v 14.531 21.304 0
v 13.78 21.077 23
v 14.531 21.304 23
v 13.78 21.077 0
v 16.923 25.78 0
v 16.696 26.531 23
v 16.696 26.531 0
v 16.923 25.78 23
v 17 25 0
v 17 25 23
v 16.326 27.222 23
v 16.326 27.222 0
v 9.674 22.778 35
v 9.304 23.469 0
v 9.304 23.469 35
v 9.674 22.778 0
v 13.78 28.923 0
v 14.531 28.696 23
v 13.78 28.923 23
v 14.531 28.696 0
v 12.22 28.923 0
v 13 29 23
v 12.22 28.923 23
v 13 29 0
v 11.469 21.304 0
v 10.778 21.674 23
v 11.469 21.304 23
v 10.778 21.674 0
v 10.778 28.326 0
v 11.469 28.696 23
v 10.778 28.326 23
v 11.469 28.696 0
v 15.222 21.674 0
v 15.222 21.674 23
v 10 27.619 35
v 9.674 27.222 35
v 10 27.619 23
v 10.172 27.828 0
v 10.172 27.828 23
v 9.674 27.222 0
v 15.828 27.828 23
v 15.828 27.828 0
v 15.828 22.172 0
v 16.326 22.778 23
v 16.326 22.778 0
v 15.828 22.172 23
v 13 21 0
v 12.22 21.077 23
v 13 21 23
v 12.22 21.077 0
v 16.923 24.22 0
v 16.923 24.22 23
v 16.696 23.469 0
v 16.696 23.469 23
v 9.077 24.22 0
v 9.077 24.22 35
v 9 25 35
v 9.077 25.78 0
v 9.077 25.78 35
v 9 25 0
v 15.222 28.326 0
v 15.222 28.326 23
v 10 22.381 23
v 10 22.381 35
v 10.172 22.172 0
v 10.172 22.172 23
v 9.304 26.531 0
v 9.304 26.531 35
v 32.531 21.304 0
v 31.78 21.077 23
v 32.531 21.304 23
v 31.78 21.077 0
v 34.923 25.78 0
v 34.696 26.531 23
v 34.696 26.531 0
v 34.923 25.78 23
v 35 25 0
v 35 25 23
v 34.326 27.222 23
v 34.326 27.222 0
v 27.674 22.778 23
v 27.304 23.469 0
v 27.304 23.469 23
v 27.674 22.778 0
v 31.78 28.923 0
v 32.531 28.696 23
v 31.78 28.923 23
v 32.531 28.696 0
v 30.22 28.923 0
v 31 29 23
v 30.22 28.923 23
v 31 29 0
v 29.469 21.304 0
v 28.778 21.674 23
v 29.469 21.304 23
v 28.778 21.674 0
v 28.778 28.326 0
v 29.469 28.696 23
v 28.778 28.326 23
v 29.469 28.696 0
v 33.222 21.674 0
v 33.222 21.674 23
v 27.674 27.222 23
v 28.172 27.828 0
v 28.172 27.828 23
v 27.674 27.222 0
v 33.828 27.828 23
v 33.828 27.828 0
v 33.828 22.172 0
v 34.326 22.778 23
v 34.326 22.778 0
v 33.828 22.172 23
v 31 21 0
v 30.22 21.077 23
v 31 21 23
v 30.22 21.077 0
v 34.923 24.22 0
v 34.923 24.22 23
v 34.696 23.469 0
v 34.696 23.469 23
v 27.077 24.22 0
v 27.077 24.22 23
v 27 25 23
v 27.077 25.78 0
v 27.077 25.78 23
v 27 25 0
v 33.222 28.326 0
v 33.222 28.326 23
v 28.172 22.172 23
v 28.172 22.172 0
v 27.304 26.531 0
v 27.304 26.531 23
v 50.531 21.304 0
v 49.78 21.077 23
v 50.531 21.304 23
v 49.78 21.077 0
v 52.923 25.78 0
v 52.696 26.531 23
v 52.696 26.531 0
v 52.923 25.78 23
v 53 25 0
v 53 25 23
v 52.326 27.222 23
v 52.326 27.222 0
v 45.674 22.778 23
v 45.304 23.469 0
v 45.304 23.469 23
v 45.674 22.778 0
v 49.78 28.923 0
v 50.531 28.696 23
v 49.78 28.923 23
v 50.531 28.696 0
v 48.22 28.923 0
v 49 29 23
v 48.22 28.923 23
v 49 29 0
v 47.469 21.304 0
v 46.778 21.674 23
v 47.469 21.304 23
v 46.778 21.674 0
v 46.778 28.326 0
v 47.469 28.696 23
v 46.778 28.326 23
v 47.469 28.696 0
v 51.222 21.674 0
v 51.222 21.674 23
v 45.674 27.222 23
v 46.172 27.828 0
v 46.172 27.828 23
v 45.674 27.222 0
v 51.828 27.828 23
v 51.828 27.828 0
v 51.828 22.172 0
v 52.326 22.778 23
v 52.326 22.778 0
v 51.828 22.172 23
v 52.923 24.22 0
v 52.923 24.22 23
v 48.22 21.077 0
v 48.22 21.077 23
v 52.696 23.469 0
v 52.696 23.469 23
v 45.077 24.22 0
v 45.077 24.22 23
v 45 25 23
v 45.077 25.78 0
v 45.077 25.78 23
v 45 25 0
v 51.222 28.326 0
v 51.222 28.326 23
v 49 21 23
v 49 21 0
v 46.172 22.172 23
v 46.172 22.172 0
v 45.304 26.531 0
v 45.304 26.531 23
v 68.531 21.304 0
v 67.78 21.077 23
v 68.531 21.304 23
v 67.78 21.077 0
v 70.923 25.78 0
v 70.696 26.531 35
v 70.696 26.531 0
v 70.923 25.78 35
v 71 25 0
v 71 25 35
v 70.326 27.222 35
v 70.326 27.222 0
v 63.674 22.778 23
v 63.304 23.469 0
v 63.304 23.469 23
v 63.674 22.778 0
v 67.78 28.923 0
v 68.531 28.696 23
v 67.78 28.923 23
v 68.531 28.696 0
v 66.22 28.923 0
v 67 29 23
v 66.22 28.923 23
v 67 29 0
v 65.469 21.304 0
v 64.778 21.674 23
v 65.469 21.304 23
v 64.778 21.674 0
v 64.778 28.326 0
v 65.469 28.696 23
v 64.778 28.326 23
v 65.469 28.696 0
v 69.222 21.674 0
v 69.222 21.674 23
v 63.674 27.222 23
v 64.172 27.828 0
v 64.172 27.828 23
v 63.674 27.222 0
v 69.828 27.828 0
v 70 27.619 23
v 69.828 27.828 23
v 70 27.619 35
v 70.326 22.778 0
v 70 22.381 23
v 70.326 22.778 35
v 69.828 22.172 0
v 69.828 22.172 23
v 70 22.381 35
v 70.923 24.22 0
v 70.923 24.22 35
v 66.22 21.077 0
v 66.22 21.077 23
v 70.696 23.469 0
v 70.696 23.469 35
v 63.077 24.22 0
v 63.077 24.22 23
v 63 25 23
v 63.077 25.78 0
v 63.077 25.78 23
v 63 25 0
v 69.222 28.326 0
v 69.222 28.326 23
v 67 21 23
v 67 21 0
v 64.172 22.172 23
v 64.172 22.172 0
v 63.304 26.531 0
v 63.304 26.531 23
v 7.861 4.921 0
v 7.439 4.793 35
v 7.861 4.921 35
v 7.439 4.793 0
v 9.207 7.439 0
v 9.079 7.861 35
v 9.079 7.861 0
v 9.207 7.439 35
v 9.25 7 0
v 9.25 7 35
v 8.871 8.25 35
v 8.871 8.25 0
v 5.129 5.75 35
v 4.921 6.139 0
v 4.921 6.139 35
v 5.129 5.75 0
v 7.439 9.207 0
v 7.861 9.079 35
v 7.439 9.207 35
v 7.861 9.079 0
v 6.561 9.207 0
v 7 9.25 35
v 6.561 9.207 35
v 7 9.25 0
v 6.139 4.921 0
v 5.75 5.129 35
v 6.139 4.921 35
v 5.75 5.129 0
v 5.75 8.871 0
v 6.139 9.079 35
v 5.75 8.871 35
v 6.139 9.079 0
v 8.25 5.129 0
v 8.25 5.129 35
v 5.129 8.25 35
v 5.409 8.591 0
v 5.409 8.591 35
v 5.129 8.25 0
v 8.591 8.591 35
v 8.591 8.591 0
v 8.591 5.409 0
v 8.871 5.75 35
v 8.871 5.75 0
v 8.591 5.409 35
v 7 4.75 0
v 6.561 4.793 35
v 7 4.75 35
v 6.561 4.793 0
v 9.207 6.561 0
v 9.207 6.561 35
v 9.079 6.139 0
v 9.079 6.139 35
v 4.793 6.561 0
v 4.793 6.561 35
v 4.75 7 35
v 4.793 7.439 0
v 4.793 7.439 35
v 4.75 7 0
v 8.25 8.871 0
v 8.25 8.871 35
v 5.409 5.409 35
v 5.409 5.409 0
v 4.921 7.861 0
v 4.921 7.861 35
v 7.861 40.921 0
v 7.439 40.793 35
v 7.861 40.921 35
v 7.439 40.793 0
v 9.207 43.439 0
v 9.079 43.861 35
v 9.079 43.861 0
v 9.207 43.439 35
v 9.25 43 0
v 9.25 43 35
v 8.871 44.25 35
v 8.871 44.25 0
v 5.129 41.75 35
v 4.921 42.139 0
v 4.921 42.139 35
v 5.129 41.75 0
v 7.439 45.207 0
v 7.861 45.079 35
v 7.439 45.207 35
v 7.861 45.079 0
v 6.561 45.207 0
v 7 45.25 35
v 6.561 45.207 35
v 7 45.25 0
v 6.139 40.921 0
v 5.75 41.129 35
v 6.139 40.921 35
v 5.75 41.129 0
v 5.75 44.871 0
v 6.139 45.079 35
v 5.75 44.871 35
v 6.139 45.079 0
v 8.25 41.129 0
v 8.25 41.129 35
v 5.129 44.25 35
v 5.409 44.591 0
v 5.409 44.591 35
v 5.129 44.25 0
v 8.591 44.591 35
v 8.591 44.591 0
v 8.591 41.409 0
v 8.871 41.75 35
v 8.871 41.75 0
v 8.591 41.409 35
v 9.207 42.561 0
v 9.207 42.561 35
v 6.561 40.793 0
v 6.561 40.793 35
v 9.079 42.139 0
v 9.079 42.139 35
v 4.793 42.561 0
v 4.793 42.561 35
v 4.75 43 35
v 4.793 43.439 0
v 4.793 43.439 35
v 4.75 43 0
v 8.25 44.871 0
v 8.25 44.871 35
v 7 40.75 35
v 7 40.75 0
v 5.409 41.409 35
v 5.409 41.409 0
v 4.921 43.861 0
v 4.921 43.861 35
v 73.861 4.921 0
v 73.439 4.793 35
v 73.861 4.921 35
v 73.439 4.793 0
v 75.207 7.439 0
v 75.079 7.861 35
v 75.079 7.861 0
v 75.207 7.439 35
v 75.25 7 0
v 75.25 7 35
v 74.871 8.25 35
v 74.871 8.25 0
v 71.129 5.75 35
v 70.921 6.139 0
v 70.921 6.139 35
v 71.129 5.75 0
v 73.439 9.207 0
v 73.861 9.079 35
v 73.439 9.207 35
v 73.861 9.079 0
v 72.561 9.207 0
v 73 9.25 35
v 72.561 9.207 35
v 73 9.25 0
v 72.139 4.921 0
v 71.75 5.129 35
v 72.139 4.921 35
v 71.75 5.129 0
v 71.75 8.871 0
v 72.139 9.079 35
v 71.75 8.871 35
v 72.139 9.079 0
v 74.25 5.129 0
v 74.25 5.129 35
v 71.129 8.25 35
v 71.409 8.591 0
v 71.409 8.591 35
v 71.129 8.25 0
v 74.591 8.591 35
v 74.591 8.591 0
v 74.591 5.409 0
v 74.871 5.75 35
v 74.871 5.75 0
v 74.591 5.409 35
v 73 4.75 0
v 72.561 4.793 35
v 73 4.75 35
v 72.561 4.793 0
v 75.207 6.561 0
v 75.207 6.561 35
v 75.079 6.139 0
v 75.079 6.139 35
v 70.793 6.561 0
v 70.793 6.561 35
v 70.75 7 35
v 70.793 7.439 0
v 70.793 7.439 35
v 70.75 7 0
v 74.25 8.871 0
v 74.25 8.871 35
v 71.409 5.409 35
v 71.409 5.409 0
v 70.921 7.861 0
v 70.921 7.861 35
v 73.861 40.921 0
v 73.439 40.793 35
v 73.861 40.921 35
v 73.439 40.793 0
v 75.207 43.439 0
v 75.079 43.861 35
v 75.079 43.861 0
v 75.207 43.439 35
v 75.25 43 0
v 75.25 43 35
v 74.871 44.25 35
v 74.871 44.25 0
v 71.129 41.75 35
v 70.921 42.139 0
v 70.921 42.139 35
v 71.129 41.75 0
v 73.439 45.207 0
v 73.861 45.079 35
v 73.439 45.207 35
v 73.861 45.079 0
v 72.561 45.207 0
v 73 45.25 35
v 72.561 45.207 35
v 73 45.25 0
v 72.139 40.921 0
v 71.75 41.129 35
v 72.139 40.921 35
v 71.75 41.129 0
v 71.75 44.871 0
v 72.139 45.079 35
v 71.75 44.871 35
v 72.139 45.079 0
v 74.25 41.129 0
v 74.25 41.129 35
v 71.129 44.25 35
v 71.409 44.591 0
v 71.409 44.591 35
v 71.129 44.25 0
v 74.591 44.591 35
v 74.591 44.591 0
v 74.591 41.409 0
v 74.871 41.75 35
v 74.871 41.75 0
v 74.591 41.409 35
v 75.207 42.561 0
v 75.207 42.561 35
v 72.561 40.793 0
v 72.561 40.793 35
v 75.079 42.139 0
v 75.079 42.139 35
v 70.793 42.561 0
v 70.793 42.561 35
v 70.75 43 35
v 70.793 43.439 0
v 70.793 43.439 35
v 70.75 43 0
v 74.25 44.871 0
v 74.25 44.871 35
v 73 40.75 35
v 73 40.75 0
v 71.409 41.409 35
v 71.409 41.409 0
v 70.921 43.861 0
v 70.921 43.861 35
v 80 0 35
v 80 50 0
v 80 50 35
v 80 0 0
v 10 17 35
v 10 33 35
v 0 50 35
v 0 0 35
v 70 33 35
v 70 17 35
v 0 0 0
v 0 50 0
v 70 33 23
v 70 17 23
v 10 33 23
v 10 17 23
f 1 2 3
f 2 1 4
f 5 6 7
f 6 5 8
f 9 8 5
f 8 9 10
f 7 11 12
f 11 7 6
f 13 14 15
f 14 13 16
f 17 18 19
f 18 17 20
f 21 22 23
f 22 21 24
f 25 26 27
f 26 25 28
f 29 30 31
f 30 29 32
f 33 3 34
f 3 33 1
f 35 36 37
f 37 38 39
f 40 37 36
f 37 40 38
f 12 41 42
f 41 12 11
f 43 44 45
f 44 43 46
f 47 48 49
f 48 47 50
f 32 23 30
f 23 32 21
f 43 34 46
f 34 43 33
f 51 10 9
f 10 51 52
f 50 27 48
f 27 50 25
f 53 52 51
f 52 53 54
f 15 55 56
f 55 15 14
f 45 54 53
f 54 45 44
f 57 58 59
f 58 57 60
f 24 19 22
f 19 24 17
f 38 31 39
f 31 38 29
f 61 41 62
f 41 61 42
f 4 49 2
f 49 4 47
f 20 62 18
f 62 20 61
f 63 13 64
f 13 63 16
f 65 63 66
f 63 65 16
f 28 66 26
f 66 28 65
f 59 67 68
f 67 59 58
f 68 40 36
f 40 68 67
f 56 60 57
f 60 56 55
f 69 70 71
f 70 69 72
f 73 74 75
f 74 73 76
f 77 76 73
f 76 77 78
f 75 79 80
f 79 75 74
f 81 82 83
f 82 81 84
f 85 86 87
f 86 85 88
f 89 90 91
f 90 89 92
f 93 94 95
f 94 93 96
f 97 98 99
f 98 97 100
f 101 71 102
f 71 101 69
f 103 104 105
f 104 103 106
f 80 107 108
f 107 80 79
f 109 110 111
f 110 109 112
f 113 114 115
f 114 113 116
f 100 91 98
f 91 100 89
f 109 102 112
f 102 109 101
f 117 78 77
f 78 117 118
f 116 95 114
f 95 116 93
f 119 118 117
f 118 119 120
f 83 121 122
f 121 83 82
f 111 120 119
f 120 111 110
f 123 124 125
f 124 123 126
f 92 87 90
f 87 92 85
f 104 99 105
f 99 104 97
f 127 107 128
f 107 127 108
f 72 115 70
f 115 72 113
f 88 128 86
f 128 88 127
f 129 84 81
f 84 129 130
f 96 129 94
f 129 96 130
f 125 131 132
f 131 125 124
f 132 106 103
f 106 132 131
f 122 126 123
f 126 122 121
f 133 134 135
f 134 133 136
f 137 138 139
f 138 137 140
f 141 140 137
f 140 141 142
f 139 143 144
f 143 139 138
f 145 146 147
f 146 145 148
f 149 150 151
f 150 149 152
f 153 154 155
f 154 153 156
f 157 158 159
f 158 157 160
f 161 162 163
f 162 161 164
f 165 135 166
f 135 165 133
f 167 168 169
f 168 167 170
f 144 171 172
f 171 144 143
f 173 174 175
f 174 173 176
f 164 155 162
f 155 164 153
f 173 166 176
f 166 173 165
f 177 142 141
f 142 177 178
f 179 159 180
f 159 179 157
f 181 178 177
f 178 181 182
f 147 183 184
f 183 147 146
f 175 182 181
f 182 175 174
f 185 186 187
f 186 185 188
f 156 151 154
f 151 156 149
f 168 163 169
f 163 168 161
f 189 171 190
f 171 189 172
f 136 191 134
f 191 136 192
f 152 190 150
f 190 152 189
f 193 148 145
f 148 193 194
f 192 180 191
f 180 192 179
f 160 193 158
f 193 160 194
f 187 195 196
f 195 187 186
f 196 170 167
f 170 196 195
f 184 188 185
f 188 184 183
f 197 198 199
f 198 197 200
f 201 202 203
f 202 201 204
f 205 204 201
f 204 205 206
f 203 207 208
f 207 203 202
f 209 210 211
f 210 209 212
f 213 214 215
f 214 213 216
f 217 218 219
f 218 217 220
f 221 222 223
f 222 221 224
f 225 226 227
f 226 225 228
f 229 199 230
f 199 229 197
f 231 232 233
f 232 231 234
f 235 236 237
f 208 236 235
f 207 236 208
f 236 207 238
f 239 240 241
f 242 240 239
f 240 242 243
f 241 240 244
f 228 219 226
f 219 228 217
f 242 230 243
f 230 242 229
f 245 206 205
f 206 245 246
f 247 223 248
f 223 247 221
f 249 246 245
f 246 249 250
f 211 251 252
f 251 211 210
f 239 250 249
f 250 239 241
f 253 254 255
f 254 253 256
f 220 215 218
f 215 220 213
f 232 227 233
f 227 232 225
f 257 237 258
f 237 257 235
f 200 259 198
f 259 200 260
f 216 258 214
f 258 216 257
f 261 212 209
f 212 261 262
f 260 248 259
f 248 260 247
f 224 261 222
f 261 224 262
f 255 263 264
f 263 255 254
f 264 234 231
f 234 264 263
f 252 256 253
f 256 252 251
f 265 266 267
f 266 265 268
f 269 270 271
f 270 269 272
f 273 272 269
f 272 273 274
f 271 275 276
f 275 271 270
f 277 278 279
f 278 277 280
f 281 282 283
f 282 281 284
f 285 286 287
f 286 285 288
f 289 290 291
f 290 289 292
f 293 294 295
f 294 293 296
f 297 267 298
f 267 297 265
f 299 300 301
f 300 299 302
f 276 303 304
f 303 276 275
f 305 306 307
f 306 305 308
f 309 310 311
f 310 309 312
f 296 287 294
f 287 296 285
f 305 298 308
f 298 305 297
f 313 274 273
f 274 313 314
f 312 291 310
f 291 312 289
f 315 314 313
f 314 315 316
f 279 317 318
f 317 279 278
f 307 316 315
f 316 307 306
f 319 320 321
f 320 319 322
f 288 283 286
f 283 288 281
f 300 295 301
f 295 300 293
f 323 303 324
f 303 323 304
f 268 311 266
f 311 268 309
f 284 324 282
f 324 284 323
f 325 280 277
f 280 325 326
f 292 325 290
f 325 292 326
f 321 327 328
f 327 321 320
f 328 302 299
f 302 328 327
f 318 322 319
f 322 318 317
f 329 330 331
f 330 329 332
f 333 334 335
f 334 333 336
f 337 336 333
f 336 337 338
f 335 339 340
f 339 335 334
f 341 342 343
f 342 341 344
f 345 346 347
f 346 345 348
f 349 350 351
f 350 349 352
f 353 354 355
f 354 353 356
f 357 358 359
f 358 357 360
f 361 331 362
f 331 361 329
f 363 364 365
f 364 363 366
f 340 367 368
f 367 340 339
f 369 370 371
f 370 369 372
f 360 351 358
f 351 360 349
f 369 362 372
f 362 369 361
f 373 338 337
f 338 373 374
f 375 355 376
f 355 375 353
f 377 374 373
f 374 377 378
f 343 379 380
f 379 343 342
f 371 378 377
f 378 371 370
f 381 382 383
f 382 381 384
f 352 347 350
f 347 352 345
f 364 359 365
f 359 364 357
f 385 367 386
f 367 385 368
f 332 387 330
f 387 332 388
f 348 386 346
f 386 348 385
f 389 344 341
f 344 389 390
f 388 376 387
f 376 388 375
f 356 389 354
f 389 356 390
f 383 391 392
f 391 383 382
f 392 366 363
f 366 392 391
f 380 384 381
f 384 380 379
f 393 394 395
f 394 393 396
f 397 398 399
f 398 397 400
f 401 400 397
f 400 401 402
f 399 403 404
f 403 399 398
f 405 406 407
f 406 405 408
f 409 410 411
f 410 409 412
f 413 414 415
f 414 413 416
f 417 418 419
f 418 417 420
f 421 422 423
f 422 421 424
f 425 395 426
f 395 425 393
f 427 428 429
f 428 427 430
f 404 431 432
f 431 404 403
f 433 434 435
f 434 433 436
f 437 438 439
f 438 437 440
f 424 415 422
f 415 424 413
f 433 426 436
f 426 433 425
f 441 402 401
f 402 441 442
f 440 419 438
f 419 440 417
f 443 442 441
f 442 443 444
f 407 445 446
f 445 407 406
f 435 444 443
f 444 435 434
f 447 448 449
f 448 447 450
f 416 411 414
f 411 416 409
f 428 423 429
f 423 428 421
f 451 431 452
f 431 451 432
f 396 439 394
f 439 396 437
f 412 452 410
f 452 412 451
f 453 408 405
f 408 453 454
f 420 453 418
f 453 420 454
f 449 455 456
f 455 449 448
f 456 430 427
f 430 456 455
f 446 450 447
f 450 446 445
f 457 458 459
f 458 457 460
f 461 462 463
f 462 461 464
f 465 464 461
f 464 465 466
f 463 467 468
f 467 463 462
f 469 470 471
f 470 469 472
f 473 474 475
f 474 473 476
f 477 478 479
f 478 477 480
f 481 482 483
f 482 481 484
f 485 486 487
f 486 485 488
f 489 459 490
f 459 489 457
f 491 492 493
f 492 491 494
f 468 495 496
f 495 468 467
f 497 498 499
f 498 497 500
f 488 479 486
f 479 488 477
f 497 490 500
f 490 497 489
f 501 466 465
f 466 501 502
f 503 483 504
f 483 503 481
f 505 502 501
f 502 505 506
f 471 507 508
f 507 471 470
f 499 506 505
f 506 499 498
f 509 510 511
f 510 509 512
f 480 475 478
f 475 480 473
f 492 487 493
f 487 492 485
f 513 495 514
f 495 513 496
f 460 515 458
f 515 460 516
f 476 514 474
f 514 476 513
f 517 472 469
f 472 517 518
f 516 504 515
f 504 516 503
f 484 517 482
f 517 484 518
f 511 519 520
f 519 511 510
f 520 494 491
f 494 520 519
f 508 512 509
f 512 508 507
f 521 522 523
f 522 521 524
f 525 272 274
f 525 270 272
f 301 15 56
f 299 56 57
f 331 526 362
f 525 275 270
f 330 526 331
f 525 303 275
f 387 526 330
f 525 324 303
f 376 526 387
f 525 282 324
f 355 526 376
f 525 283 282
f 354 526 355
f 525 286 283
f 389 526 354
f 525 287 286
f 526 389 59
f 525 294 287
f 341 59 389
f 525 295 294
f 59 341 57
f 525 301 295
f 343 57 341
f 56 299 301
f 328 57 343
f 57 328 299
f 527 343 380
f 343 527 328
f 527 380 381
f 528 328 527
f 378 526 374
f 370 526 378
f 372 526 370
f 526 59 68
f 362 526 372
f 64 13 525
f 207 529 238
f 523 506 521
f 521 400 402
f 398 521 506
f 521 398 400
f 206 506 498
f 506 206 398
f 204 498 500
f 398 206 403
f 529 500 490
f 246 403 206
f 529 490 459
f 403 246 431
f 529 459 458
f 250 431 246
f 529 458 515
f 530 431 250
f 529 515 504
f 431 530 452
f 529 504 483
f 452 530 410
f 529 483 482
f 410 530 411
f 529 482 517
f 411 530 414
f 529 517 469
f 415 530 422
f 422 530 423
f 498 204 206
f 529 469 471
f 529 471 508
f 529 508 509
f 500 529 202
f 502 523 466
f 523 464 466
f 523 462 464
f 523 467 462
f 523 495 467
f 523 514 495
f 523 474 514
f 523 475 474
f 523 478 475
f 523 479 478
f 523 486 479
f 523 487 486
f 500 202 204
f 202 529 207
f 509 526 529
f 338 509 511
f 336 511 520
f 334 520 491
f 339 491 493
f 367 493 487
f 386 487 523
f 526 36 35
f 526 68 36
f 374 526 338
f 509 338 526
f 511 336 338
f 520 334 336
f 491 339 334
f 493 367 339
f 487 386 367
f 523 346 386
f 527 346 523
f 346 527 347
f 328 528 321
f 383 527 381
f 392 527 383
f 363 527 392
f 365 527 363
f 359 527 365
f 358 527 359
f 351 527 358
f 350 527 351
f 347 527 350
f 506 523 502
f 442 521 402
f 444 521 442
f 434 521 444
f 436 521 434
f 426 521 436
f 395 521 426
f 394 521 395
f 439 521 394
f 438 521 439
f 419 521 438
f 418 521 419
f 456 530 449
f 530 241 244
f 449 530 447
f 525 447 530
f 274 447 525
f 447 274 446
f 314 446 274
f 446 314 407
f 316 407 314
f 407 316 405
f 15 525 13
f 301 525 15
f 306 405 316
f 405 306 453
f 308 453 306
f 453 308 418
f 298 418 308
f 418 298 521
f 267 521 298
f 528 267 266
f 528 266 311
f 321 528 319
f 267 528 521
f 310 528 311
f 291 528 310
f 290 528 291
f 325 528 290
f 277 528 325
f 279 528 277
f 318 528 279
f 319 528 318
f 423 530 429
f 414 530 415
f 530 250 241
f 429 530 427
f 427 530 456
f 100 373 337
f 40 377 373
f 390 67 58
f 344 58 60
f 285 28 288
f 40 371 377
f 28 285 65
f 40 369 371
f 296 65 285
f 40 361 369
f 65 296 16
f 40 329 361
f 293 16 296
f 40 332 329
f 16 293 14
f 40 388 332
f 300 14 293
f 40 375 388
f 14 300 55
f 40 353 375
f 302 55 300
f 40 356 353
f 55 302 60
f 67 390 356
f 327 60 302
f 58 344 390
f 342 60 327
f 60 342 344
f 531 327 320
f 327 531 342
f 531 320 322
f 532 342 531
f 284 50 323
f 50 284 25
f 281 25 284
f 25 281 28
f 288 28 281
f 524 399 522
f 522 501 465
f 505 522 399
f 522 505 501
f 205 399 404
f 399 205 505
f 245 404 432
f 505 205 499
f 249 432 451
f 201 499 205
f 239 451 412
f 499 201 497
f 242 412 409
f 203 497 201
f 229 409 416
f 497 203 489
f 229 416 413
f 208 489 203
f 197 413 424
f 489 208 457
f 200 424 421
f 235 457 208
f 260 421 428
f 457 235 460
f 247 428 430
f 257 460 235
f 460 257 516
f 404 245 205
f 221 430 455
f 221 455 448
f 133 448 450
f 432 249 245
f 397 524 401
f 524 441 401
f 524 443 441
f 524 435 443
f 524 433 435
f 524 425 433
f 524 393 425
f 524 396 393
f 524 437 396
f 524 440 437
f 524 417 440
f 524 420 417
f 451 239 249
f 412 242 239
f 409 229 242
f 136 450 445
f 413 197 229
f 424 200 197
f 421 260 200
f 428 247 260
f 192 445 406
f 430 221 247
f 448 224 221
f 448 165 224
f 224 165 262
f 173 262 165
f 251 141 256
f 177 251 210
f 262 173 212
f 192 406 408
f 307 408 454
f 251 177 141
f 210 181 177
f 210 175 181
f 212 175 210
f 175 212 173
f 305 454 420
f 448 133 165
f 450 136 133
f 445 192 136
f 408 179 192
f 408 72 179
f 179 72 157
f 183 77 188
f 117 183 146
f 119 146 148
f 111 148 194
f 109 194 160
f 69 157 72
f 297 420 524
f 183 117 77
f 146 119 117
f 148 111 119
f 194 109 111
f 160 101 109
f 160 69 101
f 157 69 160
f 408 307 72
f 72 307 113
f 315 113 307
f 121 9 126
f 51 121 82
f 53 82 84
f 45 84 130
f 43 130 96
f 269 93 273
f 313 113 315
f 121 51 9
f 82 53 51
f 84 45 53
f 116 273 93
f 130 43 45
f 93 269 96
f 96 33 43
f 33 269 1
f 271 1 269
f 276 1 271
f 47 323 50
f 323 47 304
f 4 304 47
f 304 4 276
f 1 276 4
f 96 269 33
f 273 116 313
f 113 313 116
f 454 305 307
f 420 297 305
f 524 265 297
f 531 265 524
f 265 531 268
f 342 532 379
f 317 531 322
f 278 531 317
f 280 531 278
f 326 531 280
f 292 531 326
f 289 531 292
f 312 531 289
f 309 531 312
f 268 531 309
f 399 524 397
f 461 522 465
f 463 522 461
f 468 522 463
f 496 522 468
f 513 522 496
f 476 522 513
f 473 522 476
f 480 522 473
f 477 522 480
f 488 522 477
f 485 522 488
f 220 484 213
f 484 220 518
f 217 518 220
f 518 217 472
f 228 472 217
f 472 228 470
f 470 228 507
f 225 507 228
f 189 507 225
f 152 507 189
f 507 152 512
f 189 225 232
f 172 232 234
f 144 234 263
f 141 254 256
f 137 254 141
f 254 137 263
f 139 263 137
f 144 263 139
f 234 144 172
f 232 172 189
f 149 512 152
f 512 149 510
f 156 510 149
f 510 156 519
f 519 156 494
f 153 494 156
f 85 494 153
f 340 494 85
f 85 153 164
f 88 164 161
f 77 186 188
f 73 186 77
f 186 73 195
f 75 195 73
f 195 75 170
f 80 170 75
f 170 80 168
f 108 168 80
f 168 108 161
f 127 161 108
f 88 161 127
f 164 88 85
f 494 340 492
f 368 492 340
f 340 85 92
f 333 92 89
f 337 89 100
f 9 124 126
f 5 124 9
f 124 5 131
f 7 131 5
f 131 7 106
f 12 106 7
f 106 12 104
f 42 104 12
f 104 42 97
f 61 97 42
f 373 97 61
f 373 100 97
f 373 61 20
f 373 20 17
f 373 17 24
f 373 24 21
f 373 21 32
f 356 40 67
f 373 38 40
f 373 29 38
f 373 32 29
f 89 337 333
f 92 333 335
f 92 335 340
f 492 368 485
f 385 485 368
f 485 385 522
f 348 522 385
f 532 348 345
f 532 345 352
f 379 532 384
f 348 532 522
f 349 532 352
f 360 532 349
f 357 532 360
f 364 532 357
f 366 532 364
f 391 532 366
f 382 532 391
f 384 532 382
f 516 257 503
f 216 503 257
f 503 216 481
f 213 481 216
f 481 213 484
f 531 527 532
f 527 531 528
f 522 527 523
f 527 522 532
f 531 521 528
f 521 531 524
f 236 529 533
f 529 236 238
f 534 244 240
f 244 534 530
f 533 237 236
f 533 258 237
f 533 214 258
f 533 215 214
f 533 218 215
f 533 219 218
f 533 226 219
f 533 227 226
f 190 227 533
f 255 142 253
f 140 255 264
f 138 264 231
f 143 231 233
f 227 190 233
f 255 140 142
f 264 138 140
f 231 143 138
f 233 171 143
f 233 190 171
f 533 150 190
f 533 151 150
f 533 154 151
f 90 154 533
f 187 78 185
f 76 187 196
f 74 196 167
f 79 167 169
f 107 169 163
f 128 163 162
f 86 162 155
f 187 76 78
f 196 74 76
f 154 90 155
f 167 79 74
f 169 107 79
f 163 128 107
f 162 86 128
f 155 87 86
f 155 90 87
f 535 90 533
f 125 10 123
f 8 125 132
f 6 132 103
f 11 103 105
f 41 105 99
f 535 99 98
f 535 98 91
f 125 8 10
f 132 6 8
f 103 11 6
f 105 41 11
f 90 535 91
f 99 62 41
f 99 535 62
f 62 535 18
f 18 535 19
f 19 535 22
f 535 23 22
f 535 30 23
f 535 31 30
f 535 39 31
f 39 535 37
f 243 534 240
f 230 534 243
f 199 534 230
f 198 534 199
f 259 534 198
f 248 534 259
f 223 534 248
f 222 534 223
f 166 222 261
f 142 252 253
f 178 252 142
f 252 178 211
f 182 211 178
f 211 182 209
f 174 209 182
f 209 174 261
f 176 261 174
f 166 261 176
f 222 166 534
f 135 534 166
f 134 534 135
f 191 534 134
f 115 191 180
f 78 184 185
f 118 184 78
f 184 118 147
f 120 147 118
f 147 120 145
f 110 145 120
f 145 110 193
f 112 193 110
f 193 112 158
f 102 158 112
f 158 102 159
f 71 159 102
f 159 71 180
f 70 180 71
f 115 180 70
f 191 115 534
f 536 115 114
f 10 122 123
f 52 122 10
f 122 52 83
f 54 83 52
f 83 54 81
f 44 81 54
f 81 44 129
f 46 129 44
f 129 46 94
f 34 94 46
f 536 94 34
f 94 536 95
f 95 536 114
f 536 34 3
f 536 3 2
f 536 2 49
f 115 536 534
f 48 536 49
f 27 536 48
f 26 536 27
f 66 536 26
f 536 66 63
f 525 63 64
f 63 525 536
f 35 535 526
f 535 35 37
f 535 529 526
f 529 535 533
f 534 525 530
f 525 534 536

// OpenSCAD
$fn = 32;

// ----------------------------------------------------------------------
// Manifold block: gallery_top manifold
// ----------------------------------------------------------------------

// --- parameters (mm) ---
block_l = 80;             // block length, X
block_w = 50;             // block width, Y
block_h = 35;             // block height, Z
port_d = 8;               // port bore diameter
port_pitch = 18;          // port pitch along X
gallery_d = 16;           // top gallery width, Y
gallery_depth = 12;       // gallery pocket depth
wall_p = 10;              // gallery end wall thickness, X
mnt_d = 4.5;              // mounting hole diameter
mnt_in = 7;               // mounting hole inset from the edges

n_ports = 4;  // ports in the row
port_x0 = (block_l - (n_ports - 1) * port_pitch) / 2;  // first port X

difference() {
  cube([block_l, block_w, block_h]);
  for (i = [0 : n_ports - 1])
    translate([port_x0 + i * port_pitch, block_w / 2, -1])
      cylinder(h = block_h + 2, d = port_d);
  translate([wall_p, block_w / 2 - gallery_d / 2, block_h - gallery_depth])
    cube([block_l - 2 * wall_p, gallery_d, gallery_depth + 1]);
  for (cx = [mnt_in, block_l - mnt_in])
    for (cy = [mnt_in, block_w - mnt_in])
      translate([cx, cy, -1]) cylinder(h = block_h + 2, d = mnt_d);
}
